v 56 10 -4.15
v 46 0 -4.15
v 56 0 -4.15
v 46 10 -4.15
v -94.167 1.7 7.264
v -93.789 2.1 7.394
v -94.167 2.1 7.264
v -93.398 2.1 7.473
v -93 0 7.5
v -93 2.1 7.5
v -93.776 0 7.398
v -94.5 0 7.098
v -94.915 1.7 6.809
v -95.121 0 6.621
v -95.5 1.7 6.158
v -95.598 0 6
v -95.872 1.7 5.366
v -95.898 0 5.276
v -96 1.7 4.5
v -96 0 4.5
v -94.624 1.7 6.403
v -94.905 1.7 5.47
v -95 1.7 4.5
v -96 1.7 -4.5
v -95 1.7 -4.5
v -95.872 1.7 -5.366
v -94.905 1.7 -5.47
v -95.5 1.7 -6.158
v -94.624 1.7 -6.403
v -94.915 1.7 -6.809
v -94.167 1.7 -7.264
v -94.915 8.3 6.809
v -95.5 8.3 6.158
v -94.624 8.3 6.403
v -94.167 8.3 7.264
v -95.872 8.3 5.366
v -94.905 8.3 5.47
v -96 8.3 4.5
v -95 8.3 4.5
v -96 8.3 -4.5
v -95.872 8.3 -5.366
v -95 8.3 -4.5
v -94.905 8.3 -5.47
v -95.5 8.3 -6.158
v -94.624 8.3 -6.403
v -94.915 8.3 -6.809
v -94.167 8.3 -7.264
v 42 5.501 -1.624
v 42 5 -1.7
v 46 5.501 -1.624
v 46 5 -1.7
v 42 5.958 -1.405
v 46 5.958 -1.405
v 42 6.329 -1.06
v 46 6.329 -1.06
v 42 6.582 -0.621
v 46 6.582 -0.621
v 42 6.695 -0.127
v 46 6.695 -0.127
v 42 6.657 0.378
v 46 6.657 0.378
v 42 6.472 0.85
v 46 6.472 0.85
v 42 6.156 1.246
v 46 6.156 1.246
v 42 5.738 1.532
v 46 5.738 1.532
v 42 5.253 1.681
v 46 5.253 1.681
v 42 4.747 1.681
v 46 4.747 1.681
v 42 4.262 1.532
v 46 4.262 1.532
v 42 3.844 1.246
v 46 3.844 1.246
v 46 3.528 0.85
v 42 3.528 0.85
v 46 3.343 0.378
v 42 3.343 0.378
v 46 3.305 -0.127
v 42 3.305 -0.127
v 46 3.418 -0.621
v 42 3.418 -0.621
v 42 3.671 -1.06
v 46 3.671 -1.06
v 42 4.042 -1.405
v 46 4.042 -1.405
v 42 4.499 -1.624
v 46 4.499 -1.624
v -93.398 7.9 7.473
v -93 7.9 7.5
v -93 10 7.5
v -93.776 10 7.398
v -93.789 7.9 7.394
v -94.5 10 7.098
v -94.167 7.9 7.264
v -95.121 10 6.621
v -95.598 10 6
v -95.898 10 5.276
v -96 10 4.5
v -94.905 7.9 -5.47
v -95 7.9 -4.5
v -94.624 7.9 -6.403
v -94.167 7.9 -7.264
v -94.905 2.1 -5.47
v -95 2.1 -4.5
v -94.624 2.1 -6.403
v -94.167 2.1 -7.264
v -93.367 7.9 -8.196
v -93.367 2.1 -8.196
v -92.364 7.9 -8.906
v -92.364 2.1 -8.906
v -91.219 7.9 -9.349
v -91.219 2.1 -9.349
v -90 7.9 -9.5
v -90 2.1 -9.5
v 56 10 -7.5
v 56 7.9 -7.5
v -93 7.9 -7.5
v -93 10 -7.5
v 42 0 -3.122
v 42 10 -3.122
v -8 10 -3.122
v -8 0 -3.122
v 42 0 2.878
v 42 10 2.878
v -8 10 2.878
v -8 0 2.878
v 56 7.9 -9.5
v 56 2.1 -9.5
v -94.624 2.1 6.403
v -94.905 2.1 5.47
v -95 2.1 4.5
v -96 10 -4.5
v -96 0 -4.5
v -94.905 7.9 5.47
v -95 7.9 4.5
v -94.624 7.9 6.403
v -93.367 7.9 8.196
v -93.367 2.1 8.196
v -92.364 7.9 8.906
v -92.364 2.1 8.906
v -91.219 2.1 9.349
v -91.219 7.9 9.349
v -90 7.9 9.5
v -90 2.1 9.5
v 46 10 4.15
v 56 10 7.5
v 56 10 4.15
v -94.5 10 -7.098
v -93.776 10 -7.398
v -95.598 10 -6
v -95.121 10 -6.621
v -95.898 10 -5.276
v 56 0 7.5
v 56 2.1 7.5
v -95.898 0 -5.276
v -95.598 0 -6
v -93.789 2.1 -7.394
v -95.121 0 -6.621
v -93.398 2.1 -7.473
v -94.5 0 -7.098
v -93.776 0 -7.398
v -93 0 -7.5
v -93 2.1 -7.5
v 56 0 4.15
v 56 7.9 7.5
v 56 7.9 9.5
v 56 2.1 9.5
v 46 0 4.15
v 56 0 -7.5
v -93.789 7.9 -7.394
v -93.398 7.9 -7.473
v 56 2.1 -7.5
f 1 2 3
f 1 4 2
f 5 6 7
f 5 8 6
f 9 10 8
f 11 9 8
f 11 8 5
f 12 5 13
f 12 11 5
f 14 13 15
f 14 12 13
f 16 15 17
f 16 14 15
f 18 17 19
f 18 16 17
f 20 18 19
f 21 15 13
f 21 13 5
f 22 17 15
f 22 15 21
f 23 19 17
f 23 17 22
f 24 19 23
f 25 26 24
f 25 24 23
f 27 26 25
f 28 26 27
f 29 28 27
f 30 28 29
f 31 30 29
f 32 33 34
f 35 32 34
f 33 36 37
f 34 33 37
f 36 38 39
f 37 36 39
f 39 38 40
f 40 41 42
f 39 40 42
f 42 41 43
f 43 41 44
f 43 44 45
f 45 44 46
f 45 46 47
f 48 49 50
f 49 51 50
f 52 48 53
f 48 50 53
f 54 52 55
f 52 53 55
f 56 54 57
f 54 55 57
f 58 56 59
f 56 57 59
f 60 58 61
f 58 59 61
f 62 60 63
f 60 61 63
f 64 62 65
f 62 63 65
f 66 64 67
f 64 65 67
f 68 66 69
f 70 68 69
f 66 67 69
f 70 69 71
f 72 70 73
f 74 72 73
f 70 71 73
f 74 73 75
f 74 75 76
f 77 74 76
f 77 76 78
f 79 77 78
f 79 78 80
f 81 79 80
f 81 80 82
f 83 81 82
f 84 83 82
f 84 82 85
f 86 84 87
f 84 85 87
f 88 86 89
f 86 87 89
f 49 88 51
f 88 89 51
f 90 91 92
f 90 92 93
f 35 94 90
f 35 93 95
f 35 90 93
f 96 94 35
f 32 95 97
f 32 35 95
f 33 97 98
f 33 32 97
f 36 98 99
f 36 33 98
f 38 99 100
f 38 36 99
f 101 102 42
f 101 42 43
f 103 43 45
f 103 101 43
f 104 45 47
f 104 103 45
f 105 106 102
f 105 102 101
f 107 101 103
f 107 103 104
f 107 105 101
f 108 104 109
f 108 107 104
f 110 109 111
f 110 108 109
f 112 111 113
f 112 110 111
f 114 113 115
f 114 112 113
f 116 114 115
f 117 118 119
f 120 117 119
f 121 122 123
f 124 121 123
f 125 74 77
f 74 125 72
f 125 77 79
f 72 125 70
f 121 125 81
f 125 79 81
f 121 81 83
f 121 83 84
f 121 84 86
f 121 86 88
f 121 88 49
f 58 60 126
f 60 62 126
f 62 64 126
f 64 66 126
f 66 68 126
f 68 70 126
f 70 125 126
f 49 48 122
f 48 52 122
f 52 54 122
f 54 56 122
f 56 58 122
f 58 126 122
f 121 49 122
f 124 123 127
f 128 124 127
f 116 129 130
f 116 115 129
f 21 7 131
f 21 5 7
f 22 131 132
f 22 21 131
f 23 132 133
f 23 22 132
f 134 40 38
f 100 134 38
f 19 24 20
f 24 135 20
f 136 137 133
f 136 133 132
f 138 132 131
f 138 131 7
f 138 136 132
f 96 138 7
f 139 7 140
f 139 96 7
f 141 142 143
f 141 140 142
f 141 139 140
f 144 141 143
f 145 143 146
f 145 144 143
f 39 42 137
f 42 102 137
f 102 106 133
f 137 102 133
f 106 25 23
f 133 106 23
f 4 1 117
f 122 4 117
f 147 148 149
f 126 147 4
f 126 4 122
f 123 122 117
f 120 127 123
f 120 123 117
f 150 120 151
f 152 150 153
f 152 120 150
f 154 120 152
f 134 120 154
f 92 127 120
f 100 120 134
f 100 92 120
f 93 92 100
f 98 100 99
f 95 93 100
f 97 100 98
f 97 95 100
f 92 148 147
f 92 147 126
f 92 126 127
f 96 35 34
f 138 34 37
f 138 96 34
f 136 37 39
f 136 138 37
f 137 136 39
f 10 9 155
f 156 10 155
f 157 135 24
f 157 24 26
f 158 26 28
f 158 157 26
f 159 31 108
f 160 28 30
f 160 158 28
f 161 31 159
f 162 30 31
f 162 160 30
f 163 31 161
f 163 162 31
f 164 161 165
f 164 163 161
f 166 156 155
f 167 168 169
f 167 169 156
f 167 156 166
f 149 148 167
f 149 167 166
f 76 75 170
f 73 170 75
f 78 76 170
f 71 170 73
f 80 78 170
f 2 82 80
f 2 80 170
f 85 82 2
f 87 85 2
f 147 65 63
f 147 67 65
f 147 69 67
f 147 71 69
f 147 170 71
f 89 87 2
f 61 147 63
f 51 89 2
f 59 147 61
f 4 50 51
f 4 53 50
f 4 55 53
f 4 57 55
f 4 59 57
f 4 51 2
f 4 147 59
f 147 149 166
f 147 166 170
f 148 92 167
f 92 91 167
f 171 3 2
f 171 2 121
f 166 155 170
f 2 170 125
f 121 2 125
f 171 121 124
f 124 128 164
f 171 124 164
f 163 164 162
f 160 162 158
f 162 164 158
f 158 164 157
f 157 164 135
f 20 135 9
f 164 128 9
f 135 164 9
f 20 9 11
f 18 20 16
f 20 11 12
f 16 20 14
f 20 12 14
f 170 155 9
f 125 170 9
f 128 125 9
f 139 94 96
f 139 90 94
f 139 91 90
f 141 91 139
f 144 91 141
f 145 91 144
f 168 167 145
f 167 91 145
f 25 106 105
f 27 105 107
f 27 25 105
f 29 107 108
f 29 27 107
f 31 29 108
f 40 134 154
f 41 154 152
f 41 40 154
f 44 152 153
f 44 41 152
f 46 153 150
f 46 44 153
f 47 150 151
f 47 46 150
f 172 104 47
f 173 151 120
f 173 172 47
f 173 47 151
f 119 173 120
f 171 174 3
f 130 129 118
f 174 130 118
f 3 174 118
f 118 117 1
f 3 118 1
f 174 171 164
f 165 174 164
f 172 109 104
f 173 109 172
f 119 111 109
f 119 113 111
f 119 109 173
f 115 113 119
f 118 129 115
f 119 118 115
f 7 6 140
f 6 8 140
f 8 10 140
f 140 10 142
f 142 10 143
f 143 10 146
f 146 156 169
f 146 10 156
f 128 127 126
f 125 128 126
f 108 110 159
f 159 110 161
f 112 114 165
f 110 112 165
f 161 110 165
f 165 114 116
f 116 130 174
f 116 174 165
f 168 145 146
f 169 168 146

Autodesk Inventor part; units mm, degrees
ref_plane "YZ Plane" through (0, 0, 0) normal (1, 0, 0) x (0, 1, 0)
ref_plane "XZ Plane" through (0, 0, 0) normal (0, 1, 0) x (-1, 0, 0)
sketch "Boceto1" plane through (0, 0, 0) normal (0, 1, 0) x (-1, 0, 0)
  line L0 (96, 7.5) -> (-96, 7.5)
  line L1 (-96, 7.5) -> (-96, -7.5)
  line L2 (-96, -7.5) -> (96, -7.5)
  line L3 (96, -7.5) -> (96, 7.5)
  line L4 (96, 7.5) -> (-96, -7.5) construction
  line L5 (-96, 7.5) -> (96, -7.5) construction
  point P0 (0, 0)
  dimension "d0" = 192
  dimension "d1" = 15
extrude "Extrusión1" add sketch "Boceto1" along normal blind 10
sketch "Boceto2" plane through (0, 0, 0) normal (1, 0, 0) x (0, 1, 0)
  line L0 (0, 7.5) -> (10, 7.5) projected
  line L1 (2.1, 7.5) -> (7.9, 7.5)
  line L2 (7.9, 7.5) -> (7.9, 9.5)
  line L3 (7.9, 9.5) -> (2.1, 9.5)
  line L4 (2.1, 9.5) -> (2.1, 7.5)
  line L5 (0, -7.5) -> (0, 7.5) projected
  line L6 (0, -7.5) -> (10, -7.5) projected
  line L7 (2.1, -7.5) -> (7.9, -7.5)
  line L8 (7.9, -7.5) -> (7.9, -9.5)
  line L9 (7.9, -9.5) -> (2.1, -9.5)
  line L10 (2.1, -9.5) -> (2.1, -7.5)
  point P0 (0, 0)
  point P1 (7.9, -7.5)
  dimension "d4" = 5.8
  dimension "d5" = 2.1
  dimension "d6" = 2
extrude "Extrusión2" add sketch "Boceto2" along normal mid plane 192
sketch "Boceto4" plane through (-96, 0, -7.5) normal (-1, 0, 0) x (0, 0, 1)
  line L0 (15, 2.1) -> (17, 2.1) projected
  line L1 (0, 7.9) -> (-2, 7.9) projected
  line L2 (17, 2.1) -> (-2, 2.1)
  line L3 (-2, 2.1) -> (-2, 7.9)
  line L4 (-2, 7.9) -> (17, 7.9)
  line L5 (17, 7.9) -> (17, 2.1)
  point P0 (7.5, 0)
extrude "Extrusión3" cut sketch "Boceto4" against normal blind 1
sketch "Boceto5" plane through (96, 0, 7.5) normal (1, 0, 0) x (0, 0, -1)
  line L0 (0, 7.9) -> (-2, 7.9) projected
  line L1 (17, 2.1) -> (17, 7.9) projected
  line L2 (-2, 7.9) -> (17, 7.9)
  line L3 (17, 7.9) -> (17, 2.1)
  line L4 (17, 2.1) -> (-2, 2.1)
  line L5 (-2, 2.1) -> (-2, 7.9)
  point P0 (7.5, 0)
extrude "Extrusión4" cut sketch "Boceto5" against normal blind 1
fillet "Empalme1" radius 5 4 edges at (95, 5, -9.5) (95, 5, 9.5) (-95, 5, -9.5) (-95, 5, 9.5)
fillet "Empalme2" radius 3 8 edges at (96, 8.95, 7.5) (96, 1.05, 7.5) (96, 8.95, -7.5) (96, 1.05, -7.5) (-96, 1.05, 7.5) (-96, 8.95, 7.5) (-96, 1.05, -7.5) (-96, 8.95, -7.5)
sketch "Boceto7" plane through (0, 10, 0) normal (0, 1, 0) x (1, 0, 0)
  line L0 (-90, 9.5) -> (90, 9.5) projected
  line L1 (-90, -9.5) -> (90, -9.5) projected
  line L2 (82.6935, 4) -> (-107.9962, 4)
  line L3 (-107.9962, 4) -> (-107.9962, -4)
  line L4 (-107.9962, -4) -> (82.6935, -4)
  line L5 (82.6935, -4) -> (82.6935, 4)
  line L6 (93, 7.5) -> (-93, 7.5) projected
  line L7 (96, 9.5) -> (66, 9.5)
  line L8 (66, 9.5) -> (66, -22.8831)
  line L9 (66, -22.8831) -> (96, -22.8831)
  line L10 (96, -22.8831) -> (96, 9.5)
  line L11 (96, -4.5) -> (96, 4.5) projected
  line L12 (66, 9.5) -> (56, 9.5)
  line L13 (56, 9.5) -> (56, 4)
  line L14 (56, 4) -> (66, 4)
  line L15 (66, 4) -> (66, 9.5)
  line L16 (66, -9.5) -> (56, -9.5)
  line L17 (56, -9.5) -> (56, -4)
  line L18 (56, -4) -> (66, -4)
  line L19 (66, -4) -> (66, -9.5)
  line L20 (66, 4) -> (46, 4)
  line L21 (46, 4) -> (46, -4)
  line L22 (46, -4) -> (66, -4)
  line L23 (66, -4) -> (66, 4)
  point P0 (90, 9.5)
  point P1 (66, 4)
  point P2 (66, -4)
  dimension "d17" = 8
  dimension "d18" = 3.5
  dimension "d19" = 30
  dimension "d20" = 10
  dimension "d23" = 10
extrude "Extrusión5" cut sketch "Boceto7" against normal through all contours L0 L8 L6 L13 | L0 L7 L10 L9 L8 L4 L5 L2 | L6 L8 L2 L13 | L2 L8 L4 L21 | L2 L5 L4 L8 | L8 L1 L17 L4
sketch "Boceto8" plane through (0, 10, 0) normal (0, 1, 0) x (1, 0, 0)
  line L0 (56, -0.8) -> (56, -7.5)
  line L1 (46, 4.15) -> (56, 4.15)
  line L2 (56, 4.15) -> (56, -4.15)
  line L3 (56, -4.15) -> (46, -4.15)
  line L4 (46, -4.15) -> (46, 4.15)
  line L5 (46, -4) -> (46, 4) projected
  line L6 (46, 4) -> (56, 4) projected
  line L7 (56, -4) -> (46, -4) projected
  point P0 (0, 0)
  dimension "d24" = 0.15
  dimension "d25" = 0.15
extrude "Extrusión6" cut sketch "Boceto8" against normal through all
sketch "Boceto10" plane through (46, 10, 4.15) normal (1, 0, 0) x (0, 0, -1)
  circle A0 centre (4.15, -5) radius 1.7
  line L0 (8.3, -10) -> (0, -10) projected
  point P0 (4.15, -10)
  point P1 (4.15, -10)
  dimension "d35" = 3.4
  dimension "d36" = 5
extrude "Extrusión8" cut sketch "Boceto10" against normal blind 7.5
sketch "Boceto11" plane through (0, 10, 0) normal (0, 1, 0) x (1, 0, 0)
  line L0 (-8, -2.8775) -> (42, -2.8775)
  line L1 (42, -2.8775) -> (42, 3.1225)
  line L2 (42, 3.1225) -> (-8, 3.1225)
  line L3 (-8, 3.1225) -> (-8, -2.8775)
  line L4 (46, -4.15) -> (46, 4.15) projected
  point P0 (0, 0)
  dimension "d39" = 6
  dimension "d40" = 50
  dimension "d41" = 4
extrude "Extrusión9" cut sketch "Boceto11" against normal through all
ref_plane "Plano de trabajo1" through (-95, 5, 4.5) normal (0, 1, 0) x (1, 0, 0)
sketch "Boceto12" plane through (-95, 5, 4.5) normal (0, 1, 0) x (1, 0, 0)
  arc A0 (0.8333, 11.7639) -> (-1, 9) centre (2, 9) ccw projected
  arc A1 (0.8333, 11.7639) -> (0, 9) centre (5, 9) ccw projected
  line L0 (0, 9) -> (0, 0) projected
  arc A2 (0, 0) -> (0.8333, -2.7639) centre (5, 0) ccw projected
  arc A3 (-1, 0) -> (0.8333, -2.7639) centre (2, 0) ccw projected
  line L1 (-1, 9) -> (-1, 0) projected
  point P0 (95, 4.5)
extrude "Extrusión10" cut sketch "Boceto12" along normal mid plane 6.6
sketch "Boceto9" plane through (0, 10, 0) normal (0, 1, 0) x (1, 0, 0)
  line L0 (38.5, 3) -> (42, 3)
  line L1 (42, 3) -> (42, -3)
  line L2 (42, -3) -> (38.5, -3)
  line L3 (38.5, -3) -> (38.5, 3)
  line L4 (38.5, 3) -> (42, -3) construction
  line L5 (42, 3) -> (38.5, -3) construction
  line L6 (46, -4.15) -> (46, 4.15) projected
  line L7 (42, 1.75) -> (46, 1.75)
  line L8 (46, 1.75) -> (46, -1.75)
  line L9 (46, -1.75) -> (42, -1.75)
  line L10 (42, -1.75) -> (42, 1.75)
  point P0 (0, 0)
  point P1 (40.25, 0)
  dimension "d28" = 6
  dimension "d29" = 3.5
  dimension "d30" = 1.75
  dimension "d31" = 3.5
  dimension "d32" = 4
properties part number "GT2RackA" material "UHMW, negro"
